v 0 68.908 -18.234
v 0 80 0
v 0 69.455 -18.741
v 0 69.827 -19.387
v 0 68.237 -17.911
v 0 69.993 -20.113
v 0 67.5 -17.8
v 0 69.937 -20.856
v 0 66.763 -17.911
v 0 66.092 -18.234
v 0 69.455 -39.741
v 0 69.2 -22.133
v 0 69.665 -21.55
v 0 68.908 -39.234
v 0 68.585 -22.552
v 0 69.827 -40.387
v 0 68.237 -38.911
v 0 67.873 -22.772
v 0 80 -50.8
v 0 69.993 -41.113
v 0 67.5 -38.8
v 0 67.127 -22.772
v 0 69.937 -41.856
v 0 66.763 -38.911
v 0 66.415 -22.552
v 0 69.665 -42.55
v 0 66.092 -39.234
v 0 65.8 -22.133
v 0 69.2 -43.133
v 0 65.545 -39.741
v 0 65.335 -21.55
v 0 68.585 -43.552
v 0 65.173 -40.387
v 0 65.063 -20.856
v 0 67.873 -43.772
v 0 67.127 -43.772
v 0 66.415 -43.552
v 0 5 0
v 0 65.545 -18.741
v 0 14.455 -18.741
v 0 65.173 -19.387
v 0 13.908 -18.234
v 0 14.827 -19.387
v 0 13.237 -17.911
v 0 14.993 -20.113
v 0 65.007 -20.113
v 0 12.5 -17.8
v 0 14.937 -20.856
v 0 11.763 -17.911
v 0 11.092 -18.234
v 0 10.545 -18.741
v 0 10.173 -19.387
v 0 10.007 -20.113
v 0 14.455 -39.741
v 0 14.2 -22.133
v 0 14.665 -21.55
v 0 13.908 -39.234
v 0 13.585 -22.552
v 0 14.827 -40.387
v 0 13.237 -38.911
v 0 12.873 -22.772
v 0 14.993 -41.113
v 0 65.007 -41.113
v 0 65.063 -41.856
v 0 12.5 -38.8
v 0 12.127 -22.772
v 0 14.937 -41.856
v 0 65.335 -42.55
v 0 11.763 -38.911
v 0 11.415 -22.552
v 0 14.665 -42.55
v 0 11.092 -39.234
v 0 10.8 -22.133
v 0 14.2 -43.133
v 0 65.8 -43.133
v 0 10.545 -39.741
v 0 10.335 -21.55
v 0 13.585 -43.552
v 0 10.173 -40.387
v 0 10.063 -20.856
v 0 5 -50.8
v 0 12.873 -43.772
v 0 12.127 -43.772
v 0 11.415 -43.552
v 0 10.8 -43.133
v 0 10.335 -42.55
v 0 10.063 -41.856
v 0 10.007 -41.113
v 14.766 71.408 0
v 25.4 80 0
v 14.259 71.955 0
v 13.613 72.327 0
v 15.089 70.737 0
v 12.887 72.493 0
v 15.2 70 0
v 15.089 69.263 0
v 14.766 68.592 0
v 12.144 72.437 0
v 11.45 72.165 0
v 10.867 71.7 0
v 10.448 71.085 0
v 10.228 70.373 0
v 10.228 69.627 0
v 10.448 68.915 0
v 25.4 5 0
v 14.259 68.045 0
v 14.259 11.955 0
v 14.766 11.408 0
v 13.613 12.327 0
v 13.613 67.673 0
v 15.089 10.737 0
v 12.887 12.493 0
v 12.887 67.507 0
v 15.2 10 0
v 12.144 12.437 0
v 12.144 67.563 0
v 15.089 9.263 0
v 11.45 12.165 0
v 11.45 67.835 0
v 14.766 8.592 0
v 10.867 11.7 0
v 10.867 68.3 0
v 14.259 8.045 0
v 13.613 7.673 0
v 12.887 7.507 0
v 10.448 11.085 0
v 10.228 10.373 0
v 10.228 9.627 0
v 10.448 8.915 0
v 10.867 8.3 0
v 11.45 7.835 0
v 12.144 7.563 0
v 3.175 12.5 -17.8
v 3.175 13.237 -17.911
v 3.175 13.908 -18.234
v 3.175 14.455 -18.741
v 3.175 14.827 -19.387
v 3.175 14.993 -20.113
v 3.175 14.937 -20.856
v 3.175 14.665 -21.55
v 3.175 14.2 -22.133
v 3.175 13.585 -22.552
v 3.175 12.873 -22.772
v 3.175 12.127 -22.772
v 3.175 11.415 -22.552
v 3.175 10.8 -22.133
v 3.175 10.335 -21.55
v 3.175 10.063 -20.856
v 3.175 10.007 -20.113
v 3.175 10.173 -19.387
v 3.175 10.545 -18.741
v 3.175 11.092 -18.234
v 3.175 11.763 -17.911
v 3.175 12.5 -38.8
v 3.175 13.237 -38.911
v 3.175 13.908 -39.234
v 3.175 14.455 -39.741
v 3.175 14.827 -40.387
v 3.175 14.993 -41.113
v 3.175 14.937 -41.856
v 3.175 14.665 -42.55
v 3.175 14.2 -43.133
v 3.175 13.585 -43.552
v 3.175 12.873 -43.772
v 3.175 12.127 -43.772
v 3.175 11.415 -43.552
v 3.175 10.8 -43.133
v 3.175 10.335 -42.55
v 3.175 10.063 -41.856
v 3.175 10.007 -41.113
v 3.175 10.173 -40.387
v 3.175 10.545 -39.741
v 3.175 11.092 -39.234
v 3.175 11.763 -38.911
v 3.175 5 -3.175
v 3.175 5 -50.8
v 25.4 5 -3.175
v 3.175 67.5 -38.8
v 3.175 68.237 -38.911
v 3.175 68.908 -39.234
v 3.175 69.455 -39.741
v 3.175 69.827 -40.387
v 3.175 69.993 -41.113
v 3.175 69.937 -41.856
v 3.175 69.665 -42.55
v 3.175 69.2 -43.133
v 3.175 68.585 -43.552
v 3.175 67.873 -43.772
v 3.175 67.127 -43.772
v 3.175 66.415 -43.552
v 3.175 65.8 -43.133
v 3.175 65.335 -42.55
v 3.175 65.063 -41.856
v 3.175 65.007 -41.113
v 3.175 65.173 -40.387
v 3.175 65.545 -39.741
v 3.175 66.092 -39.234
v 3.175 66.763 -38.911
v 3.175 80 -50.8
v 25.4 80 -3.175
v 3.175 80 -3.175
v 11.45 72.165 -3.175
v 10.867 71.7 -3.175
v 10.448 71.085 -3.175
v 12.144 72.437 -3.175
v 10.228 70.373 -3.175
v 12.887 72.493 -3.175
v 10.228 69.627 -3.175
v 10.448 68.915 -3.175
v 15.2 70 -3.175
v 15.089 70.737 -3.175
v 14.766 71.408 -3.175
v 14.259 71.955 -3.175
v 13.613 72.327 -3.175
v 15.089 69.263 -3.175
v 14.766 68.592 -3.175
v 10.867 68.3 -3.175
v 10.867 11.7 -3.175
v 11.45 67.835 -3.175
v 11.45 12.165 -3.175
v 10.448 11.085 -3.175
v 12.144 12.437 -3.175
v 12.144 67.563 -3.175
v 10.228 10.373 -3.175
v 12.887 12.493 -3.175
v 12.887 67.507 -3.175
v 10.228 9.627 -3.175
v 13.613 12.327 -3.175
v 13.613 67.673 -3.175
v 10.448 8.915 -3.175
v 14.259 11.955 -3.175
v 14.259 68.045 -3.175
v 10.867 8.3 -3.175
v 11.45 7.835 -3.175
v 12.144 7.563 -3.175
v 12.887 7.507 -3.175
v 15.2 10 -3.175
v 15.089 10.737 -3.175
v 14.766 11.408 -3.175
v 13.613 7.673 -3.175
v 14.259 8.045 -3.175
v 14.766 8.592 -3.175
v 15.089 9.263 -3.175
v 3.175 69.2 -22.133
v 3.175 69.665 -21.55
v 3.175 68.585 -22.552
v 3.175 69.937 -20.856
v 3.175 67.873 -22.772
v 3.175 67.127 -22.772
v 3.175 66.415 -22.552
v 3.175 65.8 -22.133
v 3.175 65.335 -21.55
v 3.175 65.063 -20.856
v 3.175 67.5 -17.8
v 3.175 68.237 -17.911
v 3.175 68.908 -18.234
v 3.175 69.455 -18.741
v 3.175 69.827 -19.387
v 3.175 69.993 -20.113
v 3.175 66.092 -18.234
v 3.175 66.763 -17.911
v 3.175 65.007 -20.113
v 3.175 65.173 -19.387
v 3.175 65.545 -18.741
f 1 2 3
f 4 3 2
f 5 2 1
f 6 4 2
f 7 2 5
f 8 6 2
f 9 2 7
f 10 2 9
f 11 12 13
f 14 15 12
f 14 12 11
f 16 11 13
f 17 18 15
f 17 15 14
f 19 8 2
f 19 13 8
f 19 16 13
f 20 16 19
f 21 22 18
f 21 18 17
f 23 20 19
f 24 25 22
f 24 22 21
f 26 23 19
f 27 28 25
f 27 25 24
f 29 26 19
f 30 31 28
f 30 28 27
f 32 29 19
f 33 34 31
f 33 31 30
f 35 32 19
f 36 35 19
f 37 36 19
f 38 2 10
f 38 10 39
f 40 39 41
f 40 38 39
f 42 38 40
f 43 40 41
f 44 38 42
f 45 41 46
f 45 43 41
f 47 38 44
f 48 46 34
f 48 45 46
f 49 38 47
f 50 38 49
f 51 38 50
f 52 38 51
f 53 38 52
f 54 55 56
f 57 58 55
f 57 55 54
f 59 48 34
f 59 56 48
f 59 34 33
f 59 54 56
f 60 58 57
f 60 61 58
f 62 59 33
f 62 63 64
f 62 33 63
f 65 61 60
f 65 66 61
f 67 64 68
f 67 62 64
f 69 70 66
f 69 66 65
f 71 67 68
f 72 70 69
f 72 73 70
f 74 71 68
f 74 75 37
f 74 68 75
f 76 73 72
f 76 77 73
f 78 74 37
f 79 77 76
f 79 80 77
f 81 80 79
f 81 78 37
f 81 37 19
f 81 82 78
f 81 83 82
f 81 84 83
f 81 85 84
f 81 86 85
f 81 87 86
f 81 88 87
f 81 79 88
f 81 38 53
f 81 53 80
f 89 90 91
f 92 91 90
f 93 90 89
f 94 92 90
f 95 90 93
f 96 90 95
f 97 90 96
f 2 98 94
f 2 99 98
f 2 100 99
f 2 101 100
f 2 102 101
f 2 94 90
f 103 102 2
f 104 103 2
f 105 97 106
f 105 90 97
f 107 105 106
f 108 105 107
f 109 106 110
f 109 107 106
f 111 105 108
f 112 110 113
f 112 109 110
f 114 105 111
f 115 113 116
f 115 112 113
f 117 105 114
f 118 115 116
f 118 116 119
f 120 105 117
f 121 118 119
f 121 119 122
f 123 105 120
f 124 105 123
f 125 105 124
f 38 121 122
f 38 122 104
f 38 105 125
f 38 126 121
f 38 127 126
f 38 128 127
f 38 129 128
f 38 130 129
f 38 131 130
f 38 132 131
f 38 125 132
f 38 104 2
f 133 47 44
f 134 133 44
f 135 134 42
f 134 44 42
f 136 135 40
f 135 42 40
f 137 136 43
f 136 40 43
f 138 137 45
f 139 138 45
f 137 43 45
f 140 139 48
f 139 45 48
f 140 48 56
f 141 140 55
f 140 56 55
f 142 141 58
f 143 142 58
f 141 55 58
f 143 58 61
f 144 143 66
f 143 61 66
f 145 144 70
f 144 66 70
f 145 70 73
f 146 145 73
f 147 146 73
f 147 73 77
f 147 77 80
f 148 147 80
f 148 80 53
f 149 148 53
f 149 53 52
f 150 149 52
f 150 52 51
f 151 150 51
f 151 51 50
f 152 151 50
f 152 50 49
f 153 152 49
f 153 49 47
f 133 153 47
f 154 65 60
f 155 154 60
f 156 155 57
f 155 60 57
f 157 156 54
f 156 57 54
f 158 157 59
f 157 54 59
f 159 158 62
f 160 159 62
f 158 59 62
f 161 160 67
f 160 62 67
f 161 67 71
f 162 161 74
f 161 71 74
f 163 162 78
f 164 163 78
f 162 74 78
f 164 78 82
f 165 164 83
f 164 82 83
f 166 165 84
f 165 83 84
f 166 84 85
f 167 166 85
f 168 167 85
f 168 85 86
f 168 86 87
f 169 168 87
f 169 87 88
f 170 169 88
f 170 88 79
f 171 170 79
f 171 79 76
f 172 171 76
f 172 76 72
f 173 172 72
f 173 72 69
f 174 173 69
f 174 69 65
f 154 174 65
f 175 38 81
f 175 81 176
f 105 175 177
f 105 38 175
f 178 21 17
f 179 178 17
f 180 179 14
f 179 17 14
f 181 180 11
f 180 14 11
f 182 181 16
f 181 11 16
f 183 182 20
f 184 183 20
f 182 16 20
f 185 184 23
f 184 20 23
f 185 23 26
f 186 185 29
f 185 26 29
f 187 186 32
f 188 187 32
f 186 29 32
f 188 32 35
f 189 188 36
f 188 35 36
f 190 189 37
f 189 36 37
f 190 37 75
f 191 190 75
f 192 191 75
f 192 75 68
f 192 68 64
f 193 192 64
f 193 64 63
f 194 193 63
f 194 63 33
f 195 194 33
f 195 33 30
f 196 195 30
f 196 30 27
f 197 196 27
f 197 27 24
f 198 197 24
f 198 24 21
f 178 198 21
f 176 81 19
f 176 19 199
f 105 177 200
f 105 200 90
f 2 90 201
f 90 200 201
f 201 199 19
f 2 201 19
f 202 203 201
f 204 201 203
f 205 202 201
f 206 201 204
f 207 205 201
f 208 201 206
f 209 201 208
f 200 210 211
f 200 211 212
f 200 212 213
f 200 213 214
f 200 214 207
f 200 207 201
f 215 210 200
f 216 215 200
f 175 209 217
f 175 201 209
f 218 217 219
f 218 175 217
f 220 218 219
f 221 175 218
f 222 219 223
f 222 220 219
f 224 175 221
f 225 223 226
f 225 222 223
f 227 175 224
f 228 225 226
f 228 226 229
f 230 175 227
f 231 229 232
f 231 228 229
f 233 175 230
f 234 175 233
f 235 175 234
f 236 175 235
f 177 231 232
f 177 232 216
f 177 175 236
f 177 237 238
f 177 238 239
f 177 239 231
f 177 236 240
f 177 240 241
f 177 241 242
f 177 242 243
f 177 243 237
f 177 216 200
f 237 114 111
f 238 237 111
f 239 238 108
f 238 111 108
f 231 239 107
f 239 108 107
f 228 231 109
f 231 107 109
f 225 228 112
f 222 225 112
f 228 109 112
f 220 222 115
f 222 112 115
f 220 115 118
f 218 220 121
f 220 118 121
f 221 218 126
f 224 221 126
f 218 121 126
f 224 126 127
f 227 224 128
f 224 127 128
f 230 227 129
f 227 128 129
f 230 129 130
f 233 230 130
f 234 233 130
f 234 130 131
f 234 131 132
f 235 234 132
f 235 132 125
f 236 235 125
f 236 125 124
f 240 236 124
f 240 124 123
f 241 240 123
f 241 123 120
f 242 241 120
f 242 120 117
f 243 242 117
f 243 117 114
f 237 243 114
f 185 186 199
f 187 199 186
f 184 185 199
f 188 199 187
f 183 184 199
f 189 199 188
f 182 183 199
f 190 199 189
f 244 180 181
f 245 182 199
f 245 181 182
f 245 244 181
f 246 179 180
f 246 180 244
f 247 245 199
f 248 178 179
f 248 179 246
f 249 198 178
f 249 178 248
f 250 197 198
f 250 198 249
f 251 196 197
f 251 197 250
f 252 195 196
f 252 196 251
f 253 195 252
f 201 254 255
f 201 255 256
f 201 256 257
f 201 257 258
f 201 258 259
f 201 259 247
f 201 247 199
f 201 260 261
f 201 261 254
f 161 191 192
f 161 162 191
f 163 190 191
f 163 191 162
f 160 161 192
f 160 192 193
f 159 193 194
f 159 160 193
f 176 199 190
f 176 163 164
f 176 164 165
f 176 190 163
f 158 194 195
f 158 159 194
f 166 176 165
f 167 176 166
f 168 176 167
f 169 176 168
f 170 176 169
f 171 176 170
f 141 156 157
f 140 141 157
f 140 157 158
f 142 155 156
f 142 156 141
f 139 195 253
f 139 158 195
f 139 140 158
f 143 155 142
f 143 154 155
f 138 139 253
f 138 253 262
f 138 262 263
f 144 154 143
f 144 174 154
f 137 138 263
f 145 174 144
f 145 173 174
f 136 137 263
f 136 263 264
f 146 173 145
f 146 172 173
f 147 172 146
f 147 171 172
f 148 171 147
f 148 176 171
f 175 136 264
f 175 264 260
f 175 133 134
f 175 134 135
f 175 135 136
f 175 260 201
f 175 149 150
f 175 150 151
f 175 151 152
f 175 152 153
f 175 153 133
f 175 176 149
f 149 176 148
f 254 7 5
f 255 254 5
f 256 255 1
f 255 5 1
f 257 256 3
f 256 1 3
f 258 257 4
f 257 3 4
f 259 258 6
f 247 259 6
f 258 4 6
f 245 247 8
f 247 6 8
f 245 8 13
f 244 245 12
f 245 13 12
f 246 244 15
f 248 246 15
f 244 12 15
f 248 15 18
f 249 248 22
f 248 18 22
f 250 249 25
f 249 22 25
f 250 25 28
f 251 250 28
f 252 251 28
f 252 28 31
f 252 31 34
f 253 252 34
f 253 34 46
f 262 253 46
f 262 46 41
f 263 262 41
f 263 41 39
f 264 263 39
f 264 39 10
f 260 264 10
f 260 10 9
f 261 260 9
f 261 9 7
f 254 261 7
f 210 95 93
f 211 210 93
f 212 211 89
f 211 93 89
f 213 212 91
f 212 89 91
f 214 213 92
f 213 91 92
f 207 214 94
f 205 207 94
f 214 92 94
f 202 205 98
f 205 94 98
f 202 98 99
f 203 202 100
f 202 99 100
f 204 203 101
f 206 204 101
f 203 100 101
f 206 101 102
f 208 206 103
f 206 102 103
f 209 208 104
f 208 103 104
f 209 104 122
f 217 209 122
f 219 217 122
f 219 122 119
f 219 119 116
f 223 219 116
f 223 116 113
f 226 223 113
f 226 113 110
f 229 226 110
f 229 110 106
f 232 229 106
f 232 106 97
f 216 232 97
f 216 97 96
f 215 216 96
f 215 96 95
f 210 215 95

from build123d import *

# Parameters (mm, degrees)
SALIENTE_EXTRUIR1_DEPTH = 80
CROQUIS2_R              = 2.5
CORTAR_EXTRUIR1_DEPTH   = 99.111161445
CROQUIS3_R              = 2.5
CORTAR_EXTRUIR2_DEPTH   = 99.111161445
CROQUIS4_W              = 30
CROQUIS4_H              = 10
CORTAR_EXTRUIR3_DEPTH   = 99.111161445


with BuildPart() as part:
    # Croquis1 → Saliente-Extruir1 (new body)
    with BuildSketch(Plane(origin=(0, 0, 0), x_dir=(1, 0, 0), z_dir=(0, 1, 0))):
        Polygon((25.4, 0), (0, 0), (0, 50.8), (3.175, 50.8), (3.175, 3.175), (25.4, 3.175), align=None)
    extrude(amount=SALIENTE_EXTRUIR1_DEPTH)

    # Croquis2 → Cortar-Extruir1 (cut, through all)
    with BuildSketch(Plane.ZY):
        with Locations((-41.3, 67.5)):
            Circle(CROQUIS2_R)
        with Locations((-20.3, 67.5)):
            Circle(CROQUIS2_R)
        with Locations((-20.3, 12.5)):
            Circle(CROQUIS2_R)
        with Locations((-41.3, 12.5)):
            Circle(CROQUIS2_R)
    extrude(amount=-CORTAR_EXTRUIR1_DEPTH, mode=Mode.SUBTRACT)

    # Croquis3 → Cortar-Extruir2 (cut, through all)
    with BuildSketch(Plane.XY):
        with Locations((12.7, 70)):
            Circle(CROQUIS3_R)
        with Locations((12.7, 10)):
            Circle(CROQUIS3_R)
    extrude(amount=-CORTAR_EXTRUIR2_DEPTH, mode=Mode.SUBTRACT)

    # Croquis4 → Cortar-Extruir3 (cut, through all)
    with BuildSketch(Plane.XY):
        with Locations((12.7, 0)):
            Rectangle(CROQUIS4_W, CROQUIS4_H)
    extrude(amount=-CORTAR_EXTRUIR3_DEPTH, mode=Mode.SUBTRACT)


solid = part.part
